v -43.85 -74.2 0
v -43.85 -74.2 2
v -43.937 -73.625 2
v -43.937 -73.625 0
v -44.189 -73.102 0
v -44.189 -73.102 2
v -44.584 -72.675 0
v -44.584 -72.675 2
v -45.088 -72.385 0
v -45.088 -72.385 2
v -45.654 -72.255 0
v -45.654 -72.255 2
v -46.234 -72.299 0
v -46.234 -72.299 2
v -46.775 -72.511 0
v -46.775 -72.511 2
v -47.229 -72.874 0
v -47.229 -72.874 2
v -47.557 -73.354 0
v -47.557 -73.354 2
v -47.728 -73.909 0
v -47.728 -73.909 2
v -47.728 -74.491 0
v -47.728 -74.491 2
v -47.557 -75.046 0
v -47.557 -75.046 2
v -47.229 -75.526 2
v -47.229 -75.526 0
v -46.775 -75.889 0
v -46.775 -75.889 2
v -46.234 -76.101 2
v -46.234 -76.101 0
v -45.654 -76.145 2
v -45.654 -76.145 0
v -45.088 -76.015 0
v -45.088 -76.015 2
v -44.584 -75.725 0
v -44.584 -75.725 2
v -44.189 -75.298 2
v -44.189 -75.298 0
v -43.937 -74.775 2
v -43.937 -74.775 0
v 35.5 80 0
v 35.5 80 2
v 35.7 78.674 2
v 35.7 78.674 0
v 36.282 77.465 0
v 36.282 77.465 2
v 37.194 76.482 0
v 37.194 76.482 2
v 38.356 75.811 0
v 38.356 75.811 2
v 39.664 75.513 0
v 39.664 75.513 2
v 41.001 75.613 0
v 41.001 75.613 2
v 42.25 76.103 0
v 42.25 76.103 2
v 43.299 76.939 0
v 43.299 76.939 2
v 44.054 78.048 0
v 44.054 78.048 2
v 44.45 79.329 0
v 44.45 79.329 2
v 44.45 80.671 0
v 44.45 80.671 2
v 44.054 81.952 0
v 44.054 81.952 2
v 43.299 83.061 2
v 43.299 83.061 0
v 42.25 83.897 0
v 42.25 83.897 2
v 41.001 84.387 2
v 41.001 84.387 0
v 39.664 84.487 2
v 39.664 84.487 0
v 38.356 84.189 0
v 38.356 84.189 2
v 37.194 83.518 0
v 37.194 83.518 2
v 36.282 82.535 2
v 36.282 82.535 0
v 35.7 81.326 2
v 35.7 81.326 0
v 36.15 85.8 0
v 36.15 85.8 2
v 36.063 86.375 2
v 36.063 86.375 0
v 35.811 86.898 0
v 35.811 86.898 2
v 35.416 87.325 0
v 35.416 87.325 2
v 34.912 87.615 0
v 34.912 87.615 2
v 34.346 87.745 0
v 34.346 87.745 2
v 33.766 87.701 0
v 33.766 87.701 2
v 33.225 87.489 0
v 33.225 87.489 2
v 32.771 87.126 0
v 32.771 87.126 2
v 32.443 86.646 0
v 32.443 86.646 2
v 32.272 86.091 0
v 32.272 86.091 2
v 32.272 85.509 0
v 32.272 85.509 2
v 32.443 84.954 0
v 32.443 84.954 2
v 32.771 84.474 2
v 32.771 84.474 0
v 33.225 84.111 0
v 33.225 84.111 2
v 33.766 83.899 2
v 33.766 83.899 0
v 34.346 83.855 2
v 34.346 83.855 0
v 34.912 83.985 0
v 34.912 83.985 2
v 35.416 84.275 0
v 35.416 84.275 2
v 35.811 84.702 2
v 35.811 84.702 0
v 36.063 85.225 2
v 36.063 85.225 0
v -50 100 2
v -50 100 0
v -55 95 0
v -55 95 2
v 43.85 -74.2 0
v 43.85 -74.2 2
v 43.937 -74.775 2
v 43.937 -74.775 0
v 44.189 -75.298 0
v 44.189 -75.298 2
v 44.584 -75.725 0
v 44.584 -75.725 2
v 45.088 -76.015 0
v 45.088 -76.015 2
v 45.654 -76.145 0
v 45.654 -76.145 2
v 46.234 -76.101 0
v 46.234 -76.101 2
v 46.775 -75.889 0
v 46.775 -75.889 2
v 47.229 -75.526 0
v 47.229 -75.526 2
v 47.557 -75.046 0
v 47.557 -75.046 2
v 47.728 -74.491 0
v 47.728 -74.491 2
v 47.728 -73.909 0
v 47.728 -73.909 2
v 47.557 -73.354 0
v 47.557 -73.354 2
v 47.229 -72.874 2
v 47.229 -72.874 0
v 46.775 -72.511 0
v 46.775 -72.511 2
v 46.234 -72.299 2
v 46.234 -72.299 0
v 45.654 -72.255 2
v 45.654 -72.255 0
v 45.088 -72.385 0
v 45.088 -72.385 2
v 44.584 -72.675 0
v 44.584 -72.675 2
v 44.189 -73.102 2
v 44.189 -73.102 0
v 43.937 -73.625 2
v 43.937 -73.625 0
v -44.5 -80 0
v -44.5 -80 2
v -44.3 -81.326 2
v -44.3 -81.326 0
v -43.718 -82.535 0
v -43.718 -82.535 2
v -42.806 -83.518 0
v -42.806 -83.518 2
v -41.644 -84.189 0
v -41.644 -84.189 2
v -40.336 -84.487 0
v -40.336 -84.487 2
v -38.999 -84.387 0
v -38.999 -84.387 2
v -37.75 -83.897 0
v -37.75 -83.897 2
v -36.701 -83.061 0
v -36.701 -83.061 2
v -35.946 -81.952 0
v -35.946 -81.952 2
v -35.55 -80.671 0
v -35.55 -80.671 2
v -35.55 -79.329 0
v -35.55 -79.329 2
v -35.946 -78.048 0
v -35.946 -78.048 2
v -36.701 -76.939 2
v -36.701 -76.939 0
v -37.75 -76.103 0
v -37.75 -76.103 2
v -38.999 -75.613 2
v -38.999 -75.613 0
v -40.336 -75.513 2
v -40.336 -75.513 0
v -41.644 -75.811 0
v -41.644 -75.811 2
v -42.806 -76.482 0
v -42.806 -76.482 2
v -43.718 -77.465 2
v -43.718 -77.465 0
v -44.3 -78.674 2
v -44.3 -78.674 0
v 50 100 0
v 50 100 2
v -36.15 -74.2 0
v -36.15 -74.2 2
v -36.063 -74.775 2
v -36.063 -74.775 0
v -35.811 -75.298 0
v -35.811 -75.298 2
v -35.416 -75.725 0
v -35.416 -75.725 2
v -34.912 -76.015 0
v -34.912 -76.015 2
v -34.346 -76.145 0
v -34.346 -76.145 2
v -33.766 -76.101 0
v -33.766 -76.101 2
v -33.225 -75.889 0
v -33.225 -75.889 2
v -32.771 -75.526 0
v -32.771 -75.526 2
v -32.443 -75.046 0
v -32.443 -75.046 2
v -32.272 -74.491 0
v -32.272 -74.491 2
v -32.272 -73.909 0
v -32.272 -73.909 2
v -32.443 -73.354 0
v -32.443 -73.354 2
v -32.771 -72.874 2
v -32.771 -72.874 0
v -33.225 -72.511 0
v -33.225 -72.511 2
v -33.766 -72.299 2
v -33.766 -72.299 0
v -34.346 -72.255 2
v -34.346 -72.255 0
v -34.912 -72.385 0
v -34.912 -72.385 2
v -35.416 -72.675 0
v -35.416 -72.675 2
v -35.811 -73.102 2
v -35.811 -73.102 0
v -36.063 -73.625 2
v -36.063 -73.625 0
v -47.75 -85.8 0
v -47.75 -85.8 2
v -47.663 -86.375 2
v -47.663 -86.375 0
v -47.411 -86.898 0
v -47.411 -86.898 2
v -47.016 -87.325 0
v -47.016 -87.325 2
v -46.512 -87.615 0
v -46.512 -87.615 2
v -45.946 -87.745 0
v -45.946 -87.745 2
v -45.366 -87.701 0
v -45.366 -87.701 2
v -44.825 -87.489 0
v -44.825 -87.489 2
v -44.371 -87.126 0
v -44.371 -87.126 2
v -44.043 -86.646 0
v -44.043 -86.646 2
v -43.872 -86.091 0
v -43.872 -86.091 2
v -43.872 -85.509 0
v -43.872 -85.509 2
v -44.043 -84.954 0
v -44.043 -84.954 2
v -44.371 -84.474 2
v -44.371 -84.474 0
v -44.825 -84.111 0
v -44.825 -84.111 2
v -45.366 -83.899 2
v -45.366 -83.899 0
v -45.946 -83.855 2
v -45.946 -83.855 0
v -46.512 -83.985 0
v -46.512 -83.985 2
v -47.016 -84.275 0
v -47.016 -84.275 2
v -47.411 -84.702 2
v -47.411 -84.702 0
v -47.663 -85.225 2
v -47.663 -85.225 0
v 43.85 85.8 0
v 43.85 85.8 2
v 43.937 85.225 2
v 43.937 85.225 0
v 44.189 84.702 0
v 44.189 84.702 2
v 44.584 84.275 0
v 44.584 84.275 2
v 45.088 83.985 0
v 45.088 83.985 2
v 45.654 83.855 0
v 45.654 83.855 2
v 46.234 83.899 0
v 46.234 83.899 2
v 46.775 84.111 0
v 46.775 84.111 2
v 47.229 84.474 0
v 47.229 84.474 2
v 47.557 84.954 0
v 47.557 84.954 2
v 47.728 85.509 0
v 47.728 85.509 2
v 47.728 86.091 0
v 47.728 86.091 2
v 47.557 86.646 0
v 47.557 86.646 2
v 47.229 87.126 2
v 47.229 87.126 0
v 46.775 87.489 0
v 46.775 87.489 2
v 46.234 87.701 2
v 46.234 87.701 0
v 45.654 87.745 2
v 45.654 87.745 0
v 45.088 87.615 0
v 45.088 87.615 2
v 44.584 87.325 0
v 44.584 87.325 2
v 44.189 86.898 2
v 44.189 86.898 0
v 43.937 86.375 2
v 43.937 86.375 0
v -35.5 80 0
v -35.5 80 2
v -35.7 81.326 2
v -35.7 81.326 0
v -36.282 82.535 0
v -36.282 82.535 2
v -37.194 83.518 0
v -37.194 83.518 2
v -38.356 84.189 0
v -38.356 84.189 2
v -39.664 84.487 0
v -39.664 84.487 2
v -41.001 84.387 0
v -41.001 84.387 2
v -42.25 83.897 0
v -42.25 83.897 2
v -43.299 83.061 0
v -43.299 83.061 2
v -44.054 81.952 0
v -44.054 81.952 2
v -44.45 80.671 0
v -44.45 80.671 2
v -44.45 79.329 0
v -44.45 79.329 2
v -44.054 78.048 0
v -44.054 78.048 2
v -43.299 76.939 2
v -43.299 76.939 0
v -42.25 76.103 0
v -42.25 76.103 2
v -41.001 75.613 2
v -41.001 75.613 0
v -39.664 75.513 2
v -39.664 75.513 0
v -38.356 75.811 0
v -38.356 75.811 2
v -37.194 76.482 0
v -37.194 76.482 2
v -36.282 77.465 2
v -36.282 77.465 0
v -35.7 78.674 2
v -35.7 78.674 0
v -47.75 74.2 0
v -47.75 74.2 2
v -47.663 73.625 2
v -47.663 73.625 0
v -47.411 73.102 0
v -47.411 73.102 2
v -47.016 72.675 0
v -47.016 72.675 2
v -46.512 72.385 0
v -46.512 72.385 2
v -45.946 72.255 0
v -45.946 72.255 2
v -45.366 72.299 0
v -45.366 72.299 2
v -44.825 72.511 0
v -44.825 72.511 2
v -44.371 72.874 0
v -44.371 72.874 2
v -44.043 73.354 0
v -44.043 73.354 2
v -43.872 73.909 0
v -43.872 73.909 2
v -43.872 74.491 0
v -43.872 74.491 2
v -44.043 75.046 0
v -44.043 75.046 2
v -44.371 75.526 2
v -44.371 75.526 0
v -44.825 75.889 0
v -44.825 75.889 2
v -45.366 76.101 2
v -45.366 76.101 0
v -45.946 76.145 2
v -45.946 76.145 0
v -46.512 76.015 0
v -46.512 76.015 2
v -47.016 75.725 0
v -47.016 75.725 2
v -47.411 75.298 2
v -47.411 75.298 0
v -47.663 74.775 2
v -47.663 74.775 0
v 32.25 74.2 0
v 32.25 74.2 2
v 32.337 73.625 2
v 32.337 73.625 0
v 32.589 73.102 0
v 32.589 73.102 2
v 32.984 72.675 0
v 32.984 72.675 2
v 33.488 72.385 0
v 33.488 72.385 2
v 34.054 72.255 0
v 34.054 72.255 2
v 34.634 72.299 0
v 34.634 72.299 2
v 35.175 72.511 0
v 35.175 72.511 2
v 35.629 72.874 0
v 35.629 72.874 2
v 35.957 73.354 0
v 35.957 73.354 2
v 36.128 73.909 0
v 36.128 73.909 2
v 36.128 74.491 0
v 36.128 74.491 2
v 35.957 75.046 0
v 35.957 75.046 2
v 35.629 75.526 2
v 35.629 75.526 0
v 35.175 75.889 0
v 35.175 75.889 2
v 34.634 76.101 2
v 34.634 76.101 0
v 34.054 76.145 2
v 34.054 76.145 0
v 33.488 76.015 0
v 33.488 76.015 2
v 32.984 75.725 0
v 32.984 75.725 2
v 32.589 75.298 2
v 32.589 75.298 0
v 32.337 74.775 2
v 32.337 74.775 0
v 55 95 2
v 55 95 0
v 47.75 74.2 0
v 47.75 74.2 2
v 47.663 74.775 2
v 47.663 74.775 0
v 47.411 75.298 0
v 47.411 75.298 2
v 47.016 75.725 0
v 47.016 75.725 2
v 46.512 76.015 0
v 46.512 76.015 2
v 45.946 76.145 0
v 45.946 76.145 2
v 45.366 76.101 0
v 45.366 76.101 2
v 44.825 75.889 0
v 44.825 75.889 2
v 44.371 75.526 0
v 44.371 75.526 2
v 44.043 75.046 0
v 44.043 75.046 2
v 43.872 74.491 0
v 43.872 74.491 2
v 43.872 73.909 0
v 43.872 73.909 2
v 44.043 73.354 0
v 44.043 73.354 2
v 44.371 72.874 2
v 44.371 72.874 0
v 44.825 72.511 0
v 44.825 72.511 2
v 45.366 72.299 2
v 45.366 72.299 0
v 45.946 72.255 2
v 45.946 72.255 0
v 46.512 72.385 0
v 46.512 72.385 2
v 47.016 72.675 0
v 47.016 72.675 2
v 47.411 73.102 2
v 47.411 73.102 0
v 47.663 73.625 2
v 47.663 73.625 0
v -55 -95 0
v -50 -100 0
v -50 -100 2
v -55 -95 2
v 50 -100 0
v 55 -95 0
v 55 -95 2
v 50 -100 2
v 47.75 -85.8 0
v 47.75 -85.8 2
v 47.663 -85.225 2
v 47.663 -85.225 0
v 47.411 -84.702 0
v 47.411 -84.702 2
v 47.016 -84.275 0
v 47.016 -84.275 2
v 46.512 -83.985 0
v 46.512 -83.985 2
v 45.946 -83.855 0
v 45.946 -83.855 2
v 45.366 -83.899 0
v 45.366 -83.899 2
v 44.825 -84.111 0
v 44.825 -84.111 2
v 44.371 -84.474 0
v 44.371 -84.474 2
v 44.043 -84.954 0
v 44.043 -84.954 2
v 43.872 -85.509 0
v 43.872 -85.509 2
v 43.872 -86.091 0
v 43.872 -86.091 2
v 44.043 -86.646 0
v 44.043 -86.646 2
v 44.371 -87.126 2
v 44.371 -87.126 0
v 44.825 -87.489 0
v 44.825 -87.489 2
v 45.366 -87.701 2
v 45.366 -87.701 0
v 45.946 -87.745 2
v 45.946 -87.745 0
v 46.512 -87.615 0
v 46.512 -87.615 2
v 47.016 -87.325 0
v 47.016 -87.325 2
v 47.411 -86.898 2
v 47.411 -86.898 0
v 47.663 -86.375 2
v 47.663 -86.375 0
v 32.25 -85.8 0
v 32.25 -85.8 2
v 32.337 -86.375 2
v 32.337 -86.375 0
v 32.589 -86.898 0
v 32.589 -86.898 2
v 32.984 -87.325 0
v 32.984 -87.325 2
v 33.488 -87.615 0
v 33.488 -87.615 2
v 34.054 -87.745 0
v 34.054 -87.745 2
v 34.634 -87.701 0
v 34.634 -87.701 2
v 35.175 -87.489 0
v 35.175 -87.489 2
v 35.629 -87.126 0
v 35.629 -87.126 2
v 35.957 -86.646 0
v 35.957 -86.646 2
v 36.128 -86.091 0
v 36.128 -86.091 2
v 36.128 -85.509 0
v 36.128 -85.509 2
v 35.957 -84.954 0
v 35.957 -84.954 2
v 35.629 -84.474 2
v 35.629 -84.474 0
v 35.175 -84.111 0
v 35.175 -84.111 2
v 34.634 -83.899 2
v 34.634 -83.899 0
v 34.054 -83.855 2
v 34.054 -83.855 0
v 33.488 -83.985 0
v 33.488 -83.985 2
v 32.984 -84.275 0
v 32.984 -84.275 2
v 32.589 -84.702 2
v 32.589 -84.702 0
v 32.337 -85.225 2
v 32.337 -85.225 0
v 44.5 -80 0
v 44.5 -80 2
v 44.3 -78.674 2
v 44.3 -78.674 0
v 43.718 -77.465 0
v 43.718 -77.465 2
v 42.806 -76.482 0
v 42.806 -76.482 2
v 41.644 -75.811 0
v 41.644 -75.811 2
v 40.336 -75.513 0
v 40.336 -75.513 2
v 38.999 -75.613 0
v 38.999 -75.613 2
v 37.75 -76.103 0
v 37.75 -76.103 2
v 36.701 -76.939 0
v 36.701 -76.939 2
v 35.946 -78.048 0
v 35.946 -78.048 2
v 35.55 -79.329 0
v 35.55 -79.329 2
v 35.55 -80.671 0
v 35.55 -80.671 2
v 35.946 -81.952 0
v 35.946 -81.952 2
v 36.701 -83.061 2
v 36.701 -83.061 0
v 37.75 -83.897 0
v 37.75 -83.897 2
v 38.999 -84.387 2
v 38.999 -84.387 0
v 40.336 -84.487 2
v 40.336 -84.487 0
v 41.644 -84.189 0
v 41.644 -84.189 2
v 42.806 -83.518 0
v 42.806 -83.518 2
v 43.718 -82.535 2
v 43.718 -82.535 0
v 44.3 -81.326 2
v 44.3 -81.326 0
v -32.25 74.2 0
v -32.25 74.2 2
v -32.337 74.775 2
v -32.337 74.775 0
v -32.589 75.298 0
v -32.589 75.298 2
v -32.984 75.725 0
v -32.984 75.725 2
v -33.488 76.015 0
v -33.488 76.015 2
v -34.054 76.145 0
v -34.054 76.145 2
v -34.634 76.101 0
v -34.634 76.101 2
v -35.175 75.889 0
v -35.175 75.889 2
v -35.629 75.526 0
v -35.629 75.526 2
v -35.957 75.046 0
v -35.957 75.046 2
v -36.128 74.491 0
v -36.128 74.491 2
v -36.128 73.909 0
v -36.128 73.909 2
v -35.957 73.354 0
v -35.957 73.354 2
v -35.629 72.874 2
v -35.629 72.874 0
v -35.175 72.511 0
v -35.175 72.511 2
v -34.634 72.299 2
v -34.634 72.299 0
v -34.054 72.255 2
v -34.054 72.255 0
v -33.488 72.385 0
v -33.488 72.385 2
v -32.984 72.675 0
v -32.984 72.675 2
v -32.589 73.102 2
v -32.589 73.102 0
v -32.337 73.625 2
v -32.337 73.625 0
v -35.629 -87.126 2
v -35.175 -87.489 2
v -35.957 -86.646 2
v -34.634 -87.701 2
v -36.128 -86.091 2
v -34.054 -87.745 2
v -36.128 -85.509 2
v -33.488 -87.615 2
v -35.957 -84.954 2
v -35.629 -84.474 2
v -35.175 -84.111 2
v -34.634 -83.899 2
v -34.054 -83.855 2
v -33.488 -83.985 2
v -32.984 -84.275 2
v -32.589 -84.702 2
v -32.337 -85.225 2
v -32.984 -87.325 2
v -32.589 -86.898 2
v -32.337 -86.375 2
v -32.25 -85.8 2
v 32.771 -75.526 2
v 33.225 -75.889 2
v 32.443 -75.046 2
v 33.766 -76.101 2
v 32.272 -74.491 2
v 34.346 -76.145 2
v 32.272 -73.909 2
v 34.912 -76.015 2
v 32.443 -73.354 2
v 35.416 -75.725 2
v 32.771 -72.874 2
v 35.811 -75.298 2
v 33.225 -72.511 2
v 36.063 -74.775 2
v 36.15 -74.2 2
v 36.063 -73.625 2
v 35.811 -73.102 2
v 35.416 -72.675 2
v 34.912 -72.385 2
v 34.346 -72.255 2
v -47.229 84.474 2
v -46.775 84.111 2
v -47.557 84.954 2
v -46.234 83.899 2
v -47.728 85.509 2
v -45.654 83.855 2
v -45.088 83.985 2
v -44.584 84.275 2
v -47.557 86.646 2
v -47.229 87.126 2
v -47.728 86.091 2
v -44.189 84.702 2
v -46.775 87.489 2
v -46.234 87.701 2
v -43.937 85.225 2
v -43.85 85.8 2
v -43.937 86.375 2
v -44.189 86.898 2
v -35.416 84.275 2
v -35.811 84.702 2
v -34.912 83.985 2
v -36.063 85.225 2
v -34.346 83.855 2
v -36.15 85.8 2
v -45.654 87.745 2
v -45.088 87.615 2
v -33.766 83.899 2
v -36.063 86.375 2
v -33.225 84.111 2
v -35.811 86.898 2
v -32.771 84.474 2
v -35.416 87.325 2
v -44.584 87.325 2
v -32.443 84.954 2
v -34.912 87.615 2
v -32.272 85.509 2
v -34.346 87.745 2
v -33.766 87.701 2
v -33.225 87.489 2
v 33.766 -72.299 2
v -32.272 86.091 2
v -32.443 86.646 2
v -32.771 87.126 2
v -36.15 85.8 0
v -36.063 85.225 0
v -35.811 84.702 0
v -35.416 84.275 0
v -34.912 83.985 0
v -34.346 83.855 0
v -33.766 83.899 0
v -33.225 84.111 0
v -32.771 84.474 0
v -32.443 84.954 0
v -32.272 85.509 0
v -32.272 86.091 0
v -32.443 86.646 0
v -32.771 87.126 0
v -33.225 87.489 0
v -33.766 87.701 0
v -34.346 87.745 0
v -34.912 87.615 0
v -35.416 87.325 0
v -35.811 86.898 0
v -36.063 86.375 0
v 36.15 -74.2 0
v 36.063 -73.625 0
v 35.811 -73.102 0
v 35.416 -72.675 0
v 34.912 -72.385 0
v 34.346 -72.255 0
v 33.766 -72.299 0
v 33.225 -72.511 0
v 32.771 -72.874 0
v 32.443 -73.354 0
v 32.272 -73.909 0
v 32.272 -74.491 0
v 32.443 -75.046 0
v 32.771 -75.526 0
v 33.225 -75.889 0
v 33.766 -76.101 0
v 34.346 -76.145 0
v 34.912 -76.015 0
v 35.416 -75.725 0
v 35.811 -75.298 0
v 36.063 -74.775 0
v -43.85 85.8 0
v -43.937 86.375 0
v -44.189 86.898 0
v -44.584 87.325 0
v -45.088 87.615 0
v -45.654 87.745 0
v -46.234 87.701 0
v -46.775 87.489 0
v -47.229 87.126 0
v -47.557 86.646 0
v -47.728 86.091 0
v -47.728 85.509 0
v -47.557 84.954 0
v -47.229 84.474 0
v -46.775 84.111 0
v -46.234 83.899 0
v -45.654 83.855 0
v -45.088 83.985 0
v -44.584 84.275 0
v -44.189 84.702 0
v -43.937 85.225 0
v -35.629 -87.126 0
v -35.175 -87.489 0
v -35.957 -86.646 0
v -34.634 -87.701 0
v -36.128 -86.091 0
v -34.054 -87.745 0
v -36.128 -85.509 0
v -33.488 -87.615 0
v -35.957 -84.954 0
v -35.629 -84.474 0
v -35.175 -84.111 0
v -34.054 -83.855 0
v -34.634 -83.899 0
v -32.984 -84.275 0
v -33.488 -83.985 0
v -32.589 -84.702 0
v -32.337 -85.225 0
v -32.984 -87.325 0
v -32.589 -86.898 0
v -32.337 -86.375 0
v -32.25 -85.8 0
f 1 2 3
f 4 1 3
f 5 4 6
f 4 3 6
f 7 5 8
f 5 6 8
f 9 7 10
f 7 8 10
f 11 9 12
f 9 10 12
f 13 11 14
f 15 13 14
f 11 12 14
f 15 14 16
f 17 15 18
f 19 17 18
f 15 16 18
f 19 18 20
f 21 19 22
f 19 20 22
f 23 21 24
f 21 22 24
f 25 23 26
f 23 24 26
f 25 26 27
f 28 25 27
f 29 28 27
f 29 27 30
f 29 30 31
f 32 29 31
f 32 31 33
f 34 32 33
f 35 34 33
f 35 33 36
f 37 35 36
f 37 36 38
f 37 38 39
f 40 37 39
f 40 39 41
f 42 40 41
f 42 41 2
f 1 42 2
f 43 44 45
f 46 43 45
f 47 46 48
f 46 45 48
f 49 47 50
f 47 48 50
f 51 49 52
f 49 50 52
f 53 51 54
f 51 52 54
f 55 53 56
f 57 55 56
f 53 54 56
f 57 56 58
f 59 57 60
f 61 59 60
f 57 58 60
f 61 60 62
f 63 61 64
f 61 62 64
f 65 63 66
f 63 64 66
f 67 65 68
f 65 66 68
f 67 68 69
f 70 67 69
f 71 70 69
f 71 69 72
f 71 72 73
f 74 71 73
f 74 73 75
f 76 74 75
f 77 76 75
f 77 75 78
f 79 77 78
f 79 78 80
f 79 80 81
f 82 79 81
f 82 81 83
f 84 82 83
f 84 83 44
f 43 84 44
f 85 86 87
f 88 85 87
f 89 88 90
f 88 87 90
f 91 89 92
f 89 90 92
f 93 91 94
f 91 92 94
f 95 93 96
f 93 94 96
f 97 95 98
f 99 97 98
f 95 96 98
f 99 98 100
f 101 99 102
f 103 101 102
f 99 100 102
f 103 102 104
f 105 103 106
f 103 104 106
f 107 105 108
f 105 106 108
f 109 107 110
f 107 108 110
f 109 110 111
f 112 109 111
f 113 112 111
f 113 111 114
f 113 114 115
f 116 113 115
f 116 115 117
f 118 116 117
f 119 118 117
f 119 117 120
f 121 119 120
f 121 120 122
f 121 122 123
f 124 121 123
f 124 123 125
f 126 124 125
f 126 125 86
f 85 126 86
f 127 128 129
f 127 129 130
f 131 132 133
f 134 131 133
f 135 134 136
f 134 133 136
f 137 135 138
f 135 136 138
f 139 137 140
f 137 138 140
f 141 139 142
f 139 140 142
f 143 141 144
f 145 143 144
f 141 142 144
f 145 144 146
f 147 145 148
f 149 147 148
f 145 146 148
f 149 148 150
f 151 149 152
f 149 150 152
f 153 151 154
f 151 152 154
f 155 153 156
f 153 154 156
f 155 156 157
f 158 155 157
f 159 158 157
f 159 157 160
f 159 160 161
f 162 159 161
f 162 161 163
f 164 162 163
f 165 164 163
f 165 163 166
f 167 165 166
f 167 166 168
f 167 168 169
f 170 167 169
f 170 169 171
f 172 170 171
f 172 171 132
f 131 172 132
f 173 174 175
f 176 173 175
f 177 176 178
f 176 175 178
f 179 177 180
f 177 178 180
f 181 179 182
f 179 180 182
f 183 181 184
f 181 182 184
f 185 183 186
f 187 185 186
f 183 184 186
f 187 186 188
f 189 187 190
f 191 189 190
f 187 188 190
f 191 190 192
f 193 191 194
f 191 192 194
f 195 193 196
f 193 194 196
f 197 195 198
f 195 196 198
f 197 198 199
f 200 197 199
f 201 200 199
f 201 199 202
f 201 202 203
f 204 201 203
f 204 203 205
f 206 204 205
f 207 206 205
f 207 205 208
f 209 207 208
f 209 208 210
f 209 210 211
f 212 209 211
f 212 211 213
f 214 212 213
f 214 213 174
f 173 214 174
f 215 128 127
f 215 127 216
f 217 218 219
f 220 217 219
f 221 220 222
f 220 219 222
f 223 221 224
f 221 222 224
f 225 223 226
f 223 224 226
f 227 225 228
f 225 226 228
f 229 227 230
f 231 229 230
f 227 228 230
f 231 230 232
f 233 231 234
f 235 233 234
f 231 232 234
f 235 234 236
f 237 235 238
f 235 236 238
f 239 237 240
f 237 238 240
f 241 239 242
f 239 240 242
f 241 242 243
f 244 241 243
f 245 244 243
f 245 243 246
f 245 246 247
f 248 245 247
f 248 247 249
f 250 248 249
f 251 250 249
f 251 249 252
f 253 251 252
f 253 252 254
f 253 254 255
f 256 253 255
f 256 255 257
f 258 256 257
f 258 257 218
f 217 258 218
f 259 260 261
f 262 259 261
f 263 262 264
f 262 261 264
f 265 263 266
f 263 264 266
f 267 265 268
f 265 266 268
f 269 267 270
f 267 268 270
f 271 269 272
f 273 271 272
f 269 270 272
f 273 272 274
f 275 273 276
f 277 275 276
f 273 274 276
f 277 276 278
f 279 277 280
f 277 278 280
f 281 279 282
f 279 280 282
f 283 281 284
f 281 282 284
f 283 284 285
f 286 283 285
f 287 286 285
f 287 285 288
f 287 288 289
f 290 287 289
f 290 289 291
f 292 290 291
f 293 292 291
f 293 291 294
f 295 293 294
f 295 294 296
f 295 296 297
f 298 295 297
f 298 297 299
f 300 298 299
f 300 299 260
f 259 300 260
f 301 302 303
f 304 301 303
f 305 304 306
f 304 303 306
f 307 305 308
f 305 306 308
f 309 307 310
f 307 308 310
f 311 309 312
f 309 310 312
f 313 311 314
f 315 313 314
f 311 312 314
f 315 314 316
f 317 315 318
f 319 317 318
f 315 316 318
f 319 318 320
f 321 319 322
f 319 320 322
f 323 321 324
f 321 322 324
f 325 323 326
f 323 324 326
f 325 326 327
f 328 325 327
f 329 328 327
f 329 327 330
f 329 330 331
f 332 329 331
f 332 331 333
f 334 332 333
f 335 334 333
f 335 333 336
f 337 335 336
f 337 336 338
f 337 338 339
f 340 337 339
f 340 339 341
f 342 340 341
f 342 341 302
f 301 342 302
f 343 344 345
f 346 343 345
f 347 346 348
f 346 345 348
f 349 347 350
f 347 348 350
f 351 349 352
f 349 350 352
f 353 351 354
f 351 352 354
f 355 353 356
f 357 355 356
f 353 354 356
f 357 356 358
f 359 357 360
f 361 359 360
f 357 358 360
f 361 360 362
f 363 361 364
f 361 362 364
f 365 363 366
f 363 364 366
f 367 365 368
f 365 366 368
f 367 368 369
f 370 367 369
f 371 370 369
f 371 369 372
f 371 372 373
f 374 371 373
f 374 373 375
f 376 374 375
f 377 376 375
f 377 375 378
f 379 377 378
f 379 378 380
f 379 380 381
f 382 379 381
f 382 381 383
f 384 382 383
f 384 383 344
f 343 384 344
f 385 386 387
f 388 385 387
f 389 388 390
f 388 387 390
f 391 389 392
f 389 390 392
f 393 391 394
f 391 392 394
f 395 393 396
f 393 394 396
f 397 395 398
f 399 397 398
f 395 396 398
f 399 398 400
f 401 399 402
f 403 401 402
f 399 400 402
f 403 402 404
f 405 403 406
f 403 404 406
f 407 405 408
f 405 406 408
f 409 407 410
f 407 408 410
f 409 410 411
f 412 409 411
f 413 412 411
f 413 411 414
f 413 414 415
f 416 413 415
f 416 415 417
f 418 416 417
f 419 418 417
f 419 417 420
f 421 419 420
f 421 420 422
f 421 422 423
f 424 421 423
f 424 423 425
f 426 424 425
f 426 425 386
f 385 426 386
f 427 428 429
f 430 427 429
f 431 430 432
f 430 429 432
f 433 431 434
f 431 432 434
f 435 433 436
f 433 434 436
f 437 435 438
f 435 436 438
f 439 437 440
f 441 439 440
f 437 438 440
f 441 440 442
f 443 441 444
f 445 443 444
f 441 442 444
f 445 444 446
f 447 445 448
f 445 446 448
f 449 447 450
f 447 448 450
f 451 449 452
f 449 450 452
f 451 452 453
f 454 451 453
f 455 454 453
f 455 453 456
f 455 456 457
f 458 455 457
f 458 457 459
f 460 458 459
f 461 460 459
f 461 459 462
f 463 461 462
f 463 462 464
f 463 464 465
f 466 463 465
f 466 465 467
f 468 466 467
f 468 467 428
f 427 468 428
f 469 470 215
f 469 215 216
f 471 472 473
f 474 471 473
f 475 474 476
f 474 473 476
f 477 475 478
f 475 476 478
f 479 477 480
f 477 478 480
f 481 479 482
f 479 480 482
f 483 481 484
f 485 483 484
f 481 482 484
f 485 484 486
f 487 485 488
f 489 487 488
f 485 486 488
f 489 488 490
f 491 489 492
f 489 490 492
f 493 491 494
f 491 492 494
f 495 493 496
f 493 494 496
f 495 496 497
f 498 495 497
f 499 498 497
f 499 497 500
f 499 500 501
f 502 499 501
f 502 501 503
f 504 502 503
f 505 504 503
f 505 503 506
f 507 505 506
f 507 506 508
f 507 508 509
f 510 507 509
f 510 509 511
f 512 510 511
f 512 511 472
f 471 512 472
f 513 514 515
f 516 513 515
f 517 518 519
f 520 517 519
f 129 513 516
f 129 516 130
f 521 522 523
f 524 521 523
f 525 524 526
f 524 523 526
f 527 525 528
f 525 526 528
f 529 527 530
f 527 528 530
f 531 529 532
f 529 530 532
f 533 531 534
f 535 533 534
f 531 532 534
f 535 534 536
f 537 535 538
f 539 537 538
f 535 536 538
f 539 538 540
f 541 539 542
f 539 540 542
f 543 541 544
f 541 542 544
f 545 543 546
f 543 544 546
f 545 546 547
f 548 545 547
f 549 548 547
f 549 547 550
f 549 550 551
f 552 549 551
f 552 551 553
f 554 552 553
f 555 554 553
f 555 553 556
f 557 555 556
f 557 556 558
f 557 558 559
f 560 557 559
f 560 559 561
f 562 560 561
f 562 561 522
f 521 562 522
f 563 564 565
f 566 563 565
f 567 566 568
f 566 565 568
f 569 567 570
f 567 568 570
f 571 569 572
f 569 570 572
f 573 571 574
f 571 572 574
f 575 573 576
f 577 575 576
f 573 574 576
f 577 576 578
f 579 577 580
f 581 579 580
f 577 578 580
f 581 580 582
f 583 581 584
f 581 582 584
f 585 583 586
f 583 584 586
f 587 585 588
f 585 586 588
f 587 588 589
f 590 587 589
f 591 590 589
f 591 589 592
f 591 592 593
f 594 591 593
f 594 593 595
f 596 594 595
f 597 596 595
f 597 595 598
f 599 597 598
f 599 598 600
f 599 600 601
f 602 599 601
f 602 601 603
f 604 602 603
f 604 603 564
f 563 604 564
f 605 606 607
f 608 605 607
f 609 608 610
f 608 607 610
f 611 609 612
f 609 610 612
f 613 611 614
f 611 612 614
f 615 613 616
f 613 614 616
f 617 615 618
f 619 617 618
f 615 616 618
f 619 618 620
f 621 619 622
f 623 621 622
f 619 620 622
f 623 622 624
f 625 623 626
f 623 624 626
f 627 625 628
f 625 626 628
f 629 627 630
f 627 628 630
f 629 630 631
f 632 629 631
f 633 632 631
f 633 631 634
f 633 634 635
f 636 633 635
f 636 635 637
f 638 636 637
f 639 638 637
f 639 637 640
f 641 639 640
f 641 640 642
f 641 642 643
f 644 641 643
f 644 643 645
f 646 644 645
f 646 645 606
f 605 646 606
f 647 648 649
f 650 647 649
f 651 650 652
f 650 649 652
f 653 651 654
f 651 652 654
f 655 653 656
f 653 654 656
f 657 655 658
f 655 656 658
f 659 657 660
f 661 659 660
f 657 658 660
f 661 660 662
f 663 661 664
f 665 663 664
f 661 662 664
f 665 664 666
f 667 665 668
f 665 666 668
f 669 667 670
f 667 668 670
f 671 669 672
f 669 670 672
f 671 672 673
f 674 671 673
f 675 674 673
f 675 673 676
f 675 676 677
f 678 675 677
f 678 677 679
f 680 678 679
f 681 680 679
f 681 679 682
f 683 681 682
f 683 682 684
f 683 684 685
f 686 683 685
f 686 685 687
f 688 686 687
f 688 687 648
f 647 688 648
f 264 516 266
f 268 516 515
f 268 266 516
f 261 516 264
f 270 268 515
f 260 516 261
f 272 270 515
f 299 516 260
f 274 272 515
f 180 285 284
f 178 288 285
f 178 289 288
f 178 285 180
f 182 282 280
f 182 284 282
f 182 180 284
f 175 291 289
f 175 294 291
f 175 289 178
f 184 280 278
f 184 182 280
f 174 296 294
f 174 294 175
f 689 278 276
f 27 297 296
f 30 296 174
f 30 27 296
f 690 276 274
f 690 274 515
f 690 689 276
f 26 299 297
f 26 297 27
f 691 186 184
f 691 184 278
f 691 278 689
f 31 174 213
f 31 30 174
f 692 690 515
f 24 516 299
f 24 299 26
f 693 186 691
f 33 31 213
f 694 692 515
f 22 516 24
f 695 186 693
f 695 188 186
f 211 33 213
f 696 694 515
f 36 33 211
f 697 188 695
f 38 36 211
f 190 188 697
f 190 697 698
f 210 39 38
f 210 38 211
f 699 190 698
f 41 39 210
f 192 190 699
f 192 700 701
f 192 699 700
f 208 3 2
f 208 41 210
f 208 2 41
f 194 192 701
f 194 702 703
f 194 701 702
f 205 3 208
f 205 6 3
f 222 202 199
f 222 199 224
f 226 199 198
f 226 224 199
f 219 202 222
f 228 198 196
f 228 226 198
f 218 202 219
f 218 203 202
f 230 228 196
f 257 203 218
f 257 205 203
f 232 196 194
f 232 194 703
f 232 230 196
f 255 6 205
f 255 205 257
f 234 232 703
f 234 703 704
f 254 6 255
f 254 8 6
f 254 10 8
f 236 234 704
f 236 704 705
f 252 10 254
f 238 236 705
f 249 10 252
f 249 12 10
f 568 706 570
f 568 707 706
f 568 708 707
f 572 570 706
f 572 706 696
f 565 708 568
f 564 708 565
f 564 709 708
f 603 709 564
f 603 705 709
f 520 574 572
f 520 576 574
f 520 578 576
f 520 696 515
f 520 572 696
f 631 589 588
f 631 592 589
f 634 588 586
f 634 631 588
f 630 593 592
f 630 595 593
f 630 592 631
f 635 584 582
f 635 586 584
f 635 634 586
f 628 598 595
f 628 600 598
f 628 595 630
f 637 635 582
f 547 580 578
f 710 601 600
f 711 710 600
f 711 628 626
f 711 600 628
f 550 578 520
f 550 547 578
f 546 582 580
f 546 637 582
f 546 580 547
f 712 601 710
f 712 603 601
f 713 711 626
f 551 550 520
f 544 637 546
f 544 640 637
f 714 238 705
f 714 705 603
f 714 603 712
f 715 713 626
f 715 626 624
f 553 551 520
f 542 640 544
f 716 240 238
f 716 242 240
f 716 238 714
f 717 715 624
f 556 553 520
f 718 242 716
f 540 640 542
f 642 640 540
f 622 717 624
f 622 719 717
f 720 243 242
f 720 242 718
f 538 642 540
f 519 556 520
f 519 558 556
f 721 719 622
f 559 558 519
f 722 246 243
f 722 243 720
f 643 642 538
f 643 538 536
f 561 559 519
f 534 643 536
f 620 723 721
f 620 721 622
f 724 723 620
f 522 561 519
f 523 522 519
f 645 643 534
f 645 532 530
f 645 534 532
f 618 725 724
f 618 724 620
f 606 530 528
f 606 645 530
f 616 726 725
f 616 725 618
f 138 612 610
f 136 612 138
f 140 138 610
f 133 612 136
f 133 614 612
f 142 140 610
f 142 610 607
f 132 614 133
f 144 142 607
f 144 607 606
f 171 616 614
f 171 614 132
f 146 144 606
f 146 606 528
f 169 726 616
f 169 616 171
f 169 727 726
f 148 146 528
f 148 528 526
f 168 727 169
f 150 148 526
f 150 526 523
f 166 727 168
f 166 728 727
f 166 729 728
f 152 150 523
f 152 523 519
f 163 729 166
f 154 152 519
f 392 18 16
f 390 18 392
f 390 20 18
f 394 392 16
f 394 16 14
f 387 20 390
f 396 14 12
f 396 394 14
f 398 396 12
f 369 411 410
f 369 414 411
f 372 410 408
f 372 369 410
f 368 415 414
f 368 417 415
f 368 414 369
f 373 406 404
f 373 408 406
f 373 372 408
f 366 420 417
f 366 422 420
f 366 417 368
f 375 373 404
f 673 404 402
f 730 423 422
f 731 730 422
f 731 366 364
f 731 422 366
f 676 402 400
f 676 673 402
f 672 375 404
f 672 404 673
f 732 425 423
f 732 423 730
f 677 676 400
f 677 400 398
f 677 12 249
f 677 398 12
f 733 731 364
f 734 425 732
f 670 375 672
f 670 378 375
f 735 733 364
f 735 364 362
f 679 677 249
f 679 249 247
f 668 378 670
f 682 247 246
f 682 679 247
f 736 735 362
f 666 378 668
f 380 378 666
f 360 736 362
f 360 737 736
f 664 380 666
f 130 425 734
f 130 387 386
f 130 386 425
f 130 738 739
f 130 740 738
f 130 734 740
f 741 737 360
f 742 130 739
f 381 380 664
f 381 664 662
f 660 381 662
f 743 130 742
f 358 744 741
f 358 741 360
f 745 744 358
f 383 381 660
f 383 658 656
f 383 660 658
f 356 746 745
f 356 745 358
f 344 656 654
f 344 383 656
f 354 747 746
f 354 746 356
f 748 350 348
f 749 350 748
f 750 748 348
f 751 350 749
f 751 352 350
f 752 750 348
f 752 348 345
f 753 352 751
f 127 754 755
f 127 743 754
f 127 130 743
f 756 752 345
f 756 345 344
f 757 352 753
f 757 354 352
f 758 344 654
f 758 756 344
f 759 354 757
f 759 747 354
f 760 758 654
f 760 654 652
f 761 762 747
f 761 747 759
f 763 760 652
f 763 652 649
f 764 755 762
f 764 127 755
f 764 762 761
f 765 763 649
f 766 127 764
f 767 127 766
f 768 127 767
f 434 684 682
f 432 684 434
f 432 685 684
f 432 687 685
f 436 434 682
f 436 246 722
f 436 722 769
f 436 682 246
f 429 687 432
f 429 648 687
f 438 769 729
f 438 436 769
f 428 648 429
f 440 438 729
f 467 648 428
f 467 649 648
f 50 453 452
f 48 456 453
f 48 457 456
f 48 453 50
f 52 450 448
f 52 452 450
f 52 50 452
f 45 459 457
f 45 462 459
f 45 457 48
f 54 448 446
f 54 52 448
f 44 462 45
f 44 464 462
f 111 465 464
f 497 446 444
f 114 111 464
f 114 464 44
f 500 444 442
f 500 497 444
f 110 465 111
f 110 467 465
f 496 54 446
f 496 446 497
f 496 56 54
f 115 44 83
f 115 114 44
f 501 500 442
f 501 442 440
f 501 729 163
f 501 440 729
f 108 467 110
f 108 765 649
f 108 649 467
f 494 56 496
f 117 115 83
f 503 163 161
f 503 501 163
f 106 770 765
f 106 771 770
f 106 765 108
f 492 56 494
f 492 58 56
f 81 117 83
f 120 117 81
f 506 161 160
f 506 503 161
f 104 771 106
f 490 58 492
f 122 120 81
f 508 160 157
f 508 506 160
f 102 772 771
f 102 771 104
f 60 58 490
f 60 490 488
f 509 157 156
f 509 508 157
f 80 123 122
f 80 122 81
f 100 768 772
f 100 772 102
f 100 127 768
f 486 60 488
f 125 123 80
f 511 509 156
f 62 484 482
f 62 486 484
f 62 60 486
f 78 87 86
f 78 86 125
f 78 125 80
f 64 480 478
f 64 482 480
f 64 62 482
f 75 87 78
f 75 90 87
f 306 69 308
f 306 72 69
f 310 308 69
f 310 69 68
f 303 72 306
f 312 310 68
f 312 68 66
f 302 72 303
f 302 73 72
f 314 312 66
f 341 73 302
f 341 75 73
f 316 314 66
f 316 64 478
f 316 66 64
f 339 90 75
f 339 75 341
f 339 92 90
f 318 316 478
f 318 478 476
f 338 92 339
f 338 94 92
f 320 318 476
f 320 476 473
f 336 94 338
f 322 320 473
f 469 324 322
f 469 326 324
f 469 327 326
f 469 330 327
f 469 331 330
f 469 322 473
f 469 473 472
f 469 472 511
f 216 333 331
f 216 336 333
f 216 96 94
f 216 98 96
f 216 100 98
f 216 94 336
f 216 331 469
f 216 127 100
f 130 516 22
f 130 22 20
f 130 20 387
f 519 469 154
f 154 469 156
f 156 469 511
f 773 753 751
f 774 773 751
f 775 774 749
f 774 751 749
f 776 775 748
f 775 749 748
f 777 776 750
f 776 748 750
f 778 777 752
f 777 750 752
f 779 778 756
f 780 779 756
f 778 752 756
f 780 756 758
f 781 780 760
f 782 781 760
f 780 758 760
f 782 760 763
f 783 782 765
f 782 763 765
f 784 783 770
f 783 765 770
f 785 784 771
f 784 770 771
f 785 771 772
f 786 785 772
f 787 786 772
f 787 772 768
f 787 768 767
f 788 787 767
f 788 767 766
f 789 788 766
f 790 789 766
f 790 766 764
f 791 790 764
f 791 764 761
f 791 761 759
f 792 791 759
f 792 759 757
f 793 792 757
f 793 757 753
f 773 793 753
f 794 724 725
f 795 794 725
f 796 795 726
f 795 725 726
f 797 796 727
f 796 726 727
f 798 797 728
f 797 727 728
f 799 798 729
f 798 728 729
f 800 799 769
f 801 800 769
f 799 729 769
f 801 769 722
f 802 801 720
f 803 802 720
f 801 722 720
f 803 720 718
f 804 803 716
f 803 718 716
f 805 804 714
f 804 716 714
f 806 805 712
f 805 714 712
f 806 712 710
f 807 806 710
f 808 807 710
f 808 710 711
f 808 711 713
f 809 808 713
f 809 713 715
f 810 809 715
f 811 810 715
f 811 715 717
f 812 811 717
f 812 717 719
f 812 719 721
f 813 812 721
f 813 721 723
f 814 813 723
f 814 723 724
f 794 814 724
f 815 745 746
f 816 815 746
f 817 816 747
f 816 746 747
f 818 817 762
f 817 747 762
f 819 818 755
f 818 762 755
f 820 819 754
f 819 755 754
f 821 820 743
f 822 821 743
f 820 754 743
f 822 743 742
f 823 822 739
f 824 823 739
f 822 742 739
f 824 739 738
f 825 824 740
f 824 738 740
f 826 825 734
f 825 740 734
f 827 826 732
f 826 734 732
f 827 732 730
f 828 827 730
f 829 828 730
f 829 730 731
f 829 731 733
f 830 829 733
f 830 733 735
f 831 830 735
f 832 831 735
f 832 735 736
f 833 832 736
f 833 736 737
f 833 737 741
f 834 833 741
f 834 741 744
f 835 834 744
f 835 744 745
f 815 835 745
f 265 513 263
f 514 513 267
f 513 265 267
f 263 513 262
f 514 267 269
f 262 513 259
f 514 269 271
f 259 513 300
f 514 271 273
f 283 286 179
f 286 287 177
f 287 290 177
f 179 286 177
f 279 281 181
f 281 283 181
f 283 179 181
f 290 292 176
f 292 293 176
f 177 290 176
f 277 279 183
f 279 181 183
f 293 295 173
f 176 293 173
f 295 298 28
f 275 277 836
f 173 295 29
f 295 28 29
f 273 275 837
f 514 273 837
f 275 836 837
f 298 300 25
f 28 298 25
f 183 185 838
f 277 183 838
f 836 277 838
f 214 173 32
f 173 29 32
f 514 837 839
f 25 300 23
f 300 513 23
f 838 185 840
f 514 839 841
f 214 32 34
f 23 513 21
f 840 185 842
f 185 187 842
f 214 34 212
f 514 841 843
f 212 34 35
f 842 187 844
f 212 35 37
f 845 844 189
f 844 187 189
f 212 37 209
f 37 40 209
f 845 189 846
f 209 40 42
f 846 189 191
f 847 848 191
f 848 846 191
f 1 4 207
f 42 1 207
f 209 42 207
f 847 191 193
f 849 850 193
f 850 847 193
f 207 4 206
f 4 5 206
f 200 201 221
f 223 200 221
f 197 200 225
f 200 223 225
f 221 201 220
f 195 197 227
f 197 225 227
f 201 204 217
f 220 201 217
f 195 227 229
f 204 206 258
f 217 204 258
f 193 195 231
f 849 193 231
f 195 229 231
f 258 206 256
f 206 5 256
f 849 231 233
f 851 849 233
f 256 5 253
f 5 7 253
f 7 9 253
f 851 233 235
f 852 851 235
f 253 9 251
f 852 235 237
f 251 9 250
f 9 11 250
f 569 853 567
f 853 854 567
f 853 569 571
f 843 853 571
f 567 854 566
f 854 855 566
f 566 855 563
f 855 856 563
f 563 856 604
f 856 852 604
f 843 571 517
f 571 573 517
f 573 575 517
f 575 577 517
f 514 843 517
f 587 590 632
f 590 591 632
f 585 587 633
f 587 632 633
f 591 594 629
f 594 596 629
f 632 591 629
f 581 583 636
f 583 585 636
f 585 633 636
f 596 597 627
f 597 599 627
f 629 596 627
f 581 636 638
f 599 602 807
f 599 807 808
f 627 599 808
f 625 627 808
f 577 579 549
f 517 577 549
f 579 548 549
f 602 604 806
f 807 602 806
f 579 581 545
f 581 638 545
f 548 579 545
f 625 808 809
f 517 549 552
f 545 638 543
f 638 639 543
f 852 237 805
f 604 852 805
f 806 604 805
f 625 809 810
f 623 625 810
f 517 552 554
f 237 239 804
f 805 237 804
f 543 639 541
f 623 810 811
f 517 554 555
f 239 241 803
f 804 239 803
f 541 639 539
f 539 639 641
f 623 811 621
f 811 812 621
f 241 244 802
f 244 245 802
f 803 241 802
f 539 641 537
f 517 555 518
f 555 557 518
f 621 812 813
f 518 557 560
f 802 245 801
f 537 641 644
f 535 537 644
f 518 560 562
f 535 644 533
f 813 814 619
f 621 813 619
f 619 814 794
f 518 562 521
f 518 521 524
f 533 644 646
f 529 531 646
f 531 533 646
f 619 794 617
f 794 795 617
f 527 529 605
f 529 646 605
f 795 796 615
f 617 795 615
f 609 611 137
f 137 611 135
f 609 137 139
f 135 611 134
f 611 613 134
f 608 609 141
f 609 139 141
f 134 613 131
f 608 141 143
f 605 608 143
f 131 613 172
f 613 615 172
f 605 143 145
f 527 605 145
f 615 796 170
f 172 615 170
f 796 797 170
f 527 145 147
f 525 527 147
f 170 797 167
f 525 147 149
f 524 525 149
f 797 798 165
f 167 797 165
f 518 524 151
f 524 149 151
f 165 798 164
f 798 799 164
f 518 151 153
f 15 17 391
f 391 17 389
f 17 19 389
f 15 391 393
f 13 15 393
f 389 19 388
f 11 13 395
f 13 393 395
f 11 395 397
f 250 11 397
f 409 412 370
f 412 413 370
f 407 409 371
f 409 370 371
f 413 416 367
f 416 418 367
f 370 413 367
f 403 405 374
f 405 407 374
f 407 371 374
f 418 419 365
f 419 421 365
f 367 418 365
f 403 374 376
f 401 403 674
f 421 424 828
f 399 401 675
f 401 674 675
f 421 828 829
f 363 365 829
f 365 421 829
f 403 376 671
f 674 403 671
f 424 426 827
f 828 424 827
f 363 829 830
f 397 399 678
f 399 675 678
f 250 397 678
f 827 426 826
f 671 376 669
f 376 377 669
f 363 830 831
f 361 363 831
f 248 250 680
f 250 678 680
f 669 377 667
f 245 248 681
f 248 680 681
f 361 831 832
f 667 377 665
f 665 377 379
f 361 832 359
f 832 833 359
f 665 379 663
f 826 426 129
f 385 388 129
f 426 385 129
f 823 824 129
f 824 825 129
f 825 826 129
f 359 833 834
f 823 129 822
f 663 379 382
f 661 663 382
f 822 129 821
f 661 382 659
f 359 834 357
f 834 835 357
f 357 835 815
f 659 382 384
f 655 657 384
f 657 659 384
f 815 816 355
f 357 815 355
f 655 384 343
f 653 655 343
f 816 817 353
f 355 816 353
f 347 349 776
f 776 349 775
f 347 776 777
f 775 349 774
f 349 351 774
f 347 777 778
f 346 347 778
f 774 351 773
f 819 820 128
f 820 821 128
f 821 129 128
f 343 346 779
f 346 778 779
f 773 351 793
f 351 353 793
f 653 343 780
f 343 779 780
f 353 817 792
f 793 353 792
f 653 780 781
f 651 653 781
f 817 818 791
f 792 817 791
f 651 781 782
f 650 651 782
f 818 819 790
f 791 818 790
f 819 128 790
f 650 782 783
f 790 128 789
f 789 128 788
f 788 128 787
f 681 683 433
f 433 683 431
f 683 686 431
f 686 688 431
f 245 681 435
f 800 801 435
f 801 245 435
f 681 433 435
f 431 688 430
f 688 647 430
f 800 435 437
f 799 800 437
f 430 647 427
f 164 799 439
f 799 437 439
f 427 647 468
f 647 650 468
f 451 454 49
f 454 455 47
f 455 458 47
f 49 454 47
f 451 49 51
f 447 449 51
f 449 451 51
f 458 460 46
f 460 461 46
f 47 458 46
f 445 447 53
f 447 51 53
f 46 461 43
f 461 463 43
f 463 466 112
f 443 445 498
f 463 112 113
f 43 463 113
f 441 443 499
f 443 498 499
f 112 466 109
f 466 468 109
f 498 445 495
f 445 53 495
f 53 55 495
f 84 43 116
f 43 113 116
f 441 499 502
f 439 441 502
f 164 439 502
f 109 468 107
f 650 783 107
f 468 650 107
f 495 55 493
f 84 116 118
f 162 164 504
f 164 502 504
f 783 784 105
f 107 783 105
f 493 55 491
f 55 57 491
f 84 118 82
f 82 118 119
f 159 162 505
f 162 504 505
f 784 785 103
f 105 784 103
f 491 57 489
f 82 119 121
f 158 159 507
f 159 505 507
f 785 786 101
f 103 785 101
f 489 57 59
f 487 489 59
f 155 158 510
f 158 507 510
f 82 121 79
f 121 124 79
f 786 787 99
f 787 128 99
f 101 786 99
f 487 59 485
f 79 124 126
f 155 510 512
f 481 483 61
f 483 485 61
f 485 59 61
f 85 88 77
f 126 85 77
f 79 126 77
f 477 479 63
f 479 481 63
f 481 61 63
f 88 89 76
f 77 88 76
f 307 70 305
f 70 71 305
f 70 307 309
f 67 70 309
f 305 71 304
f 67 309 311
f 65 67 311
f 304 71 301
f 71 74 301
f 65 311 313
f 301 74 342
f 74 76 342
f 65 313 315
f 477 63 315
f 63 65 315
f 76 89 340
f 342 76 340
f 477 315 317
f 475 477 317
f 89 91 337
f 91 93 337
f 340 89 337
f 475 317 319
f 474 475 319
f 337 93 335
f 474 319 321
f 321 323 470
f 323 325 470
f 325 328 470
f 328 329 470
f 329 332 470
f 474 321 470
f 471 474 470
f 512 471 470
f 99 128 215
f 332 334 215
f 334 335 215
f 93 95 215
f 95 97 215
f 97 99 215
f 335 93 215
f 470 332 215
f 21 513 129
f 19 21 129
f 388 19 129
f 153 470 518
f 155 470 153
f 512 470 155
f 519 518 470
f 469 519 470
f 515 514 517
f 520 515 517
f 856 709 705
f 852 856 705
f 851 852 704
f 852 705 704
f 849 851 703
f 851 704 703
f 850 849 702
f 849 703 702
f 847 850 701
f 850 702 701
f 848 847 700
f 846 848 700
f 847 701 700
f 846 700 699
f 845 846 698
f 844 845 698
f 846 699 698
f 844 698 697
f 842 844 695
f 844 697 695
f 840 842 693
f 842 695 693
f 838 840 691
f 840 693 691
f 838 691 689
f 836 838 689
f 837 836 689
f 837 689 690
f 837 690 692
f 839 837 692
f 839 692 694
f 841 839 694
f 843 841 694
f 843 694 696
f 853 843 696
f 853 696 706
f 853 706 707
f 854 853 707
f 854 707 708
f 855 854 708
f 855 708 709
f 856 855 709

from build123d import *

# Parameters (mm, degrees)
SKETCH1_W           = 110
SKETCH1_H           = 200
BOSS_EXTRUDE1_DEPTH = 2
SKETCH6_R           = 4.5
SKETCH6_R_2         = 1.95
LEANDUT_HOLES_DEPTH = 115.144645078
CHAMFER1_SIZE       = 5


with BuildPart() as part:
    # Sketch1 → Boss-Extrude1 (new body)
    with BuildSketch(Plane.XY):
        Rectangle(SKETCH1_W, SKETCH1_H)
    extrude(amount=BOSS_EXTRUDE1_DEPTH)

    # Sketch6 → Leandut_holes (cut, through all)
    with BuildSketch(Plane.XY.offset(2)):
        with Locations((-40, 80)):
            Circle(SKETCH6_R)
        with Locations((-45.8, 85.8)):
            Circle(SKETCH6_R_2)
        with Locations((-45.8, 74.2)):
            Circle(SKETCH6_R_2)
        with Locations((-34.2, 74.2)):
            Circle(SKETCH6_R_2)
        with Locations((-34.2, 85.8)):
            Circle(SKETCH6_R_2)
        with Locations((34.2, 85.8)):
            Circle(SKETCH6_R_2)
        with Locations((34.2, 74.2)):
            Circle(SKETCH6_R_2)
        with Locations((45.8, 74.2)):
            Circle(SKETCH6_R_2)
        with Locations((45.8, 85.8)):
            Circle(SKETCH6_R_2)
        with Locations((40, 80)):
            Circle(SKETCH6_R)
        with Locations((40, -80)):
            Circle(SKETCH6_R)
        with Locations((45.8, -85.8)):
            Circle(SKETCH6_R_2)
        with Locations((45.8, -74.2)):
            Circle(SKETCH6_R_2)
        with Locations((34.2, -74.2)):
            Circle(SKETCH6_R_2)
        with Locations((34.2, -85.8)):
            Circle(SKETCH6_R_2)
        with Locations((-34.2, -85.8)):
            Circle(SKETCH6_R_2)
        with Locations((-34.2, -74.2)):
            Circle(SKETCH6_R_2)
        with Locations((-45.8, -74.2)):
            Circle(SKETCH6_R_2)
        with Locations((-45.8, -85.8)):
            Circle(SKETCH6_R_2)
        with Locations((-40, -80)):
            Circle(SKETCH6_R)
    extrude(amount=-LEANDUT_HOLES_DEPTH, mode=Mode.SUBTRACT)

    # Chamfer1
    chamfer1_edges = [part.edges().sort_by_distance(p)[0] for p in [
        (-55, -100, 1),
        (55, -100, 1),
        (55, 100, 1),
        (-55, 100, 1),
    ]]
    chamfer(chamfer1_edges, length=CHAMFER1_SIZE)


solid = part.part
